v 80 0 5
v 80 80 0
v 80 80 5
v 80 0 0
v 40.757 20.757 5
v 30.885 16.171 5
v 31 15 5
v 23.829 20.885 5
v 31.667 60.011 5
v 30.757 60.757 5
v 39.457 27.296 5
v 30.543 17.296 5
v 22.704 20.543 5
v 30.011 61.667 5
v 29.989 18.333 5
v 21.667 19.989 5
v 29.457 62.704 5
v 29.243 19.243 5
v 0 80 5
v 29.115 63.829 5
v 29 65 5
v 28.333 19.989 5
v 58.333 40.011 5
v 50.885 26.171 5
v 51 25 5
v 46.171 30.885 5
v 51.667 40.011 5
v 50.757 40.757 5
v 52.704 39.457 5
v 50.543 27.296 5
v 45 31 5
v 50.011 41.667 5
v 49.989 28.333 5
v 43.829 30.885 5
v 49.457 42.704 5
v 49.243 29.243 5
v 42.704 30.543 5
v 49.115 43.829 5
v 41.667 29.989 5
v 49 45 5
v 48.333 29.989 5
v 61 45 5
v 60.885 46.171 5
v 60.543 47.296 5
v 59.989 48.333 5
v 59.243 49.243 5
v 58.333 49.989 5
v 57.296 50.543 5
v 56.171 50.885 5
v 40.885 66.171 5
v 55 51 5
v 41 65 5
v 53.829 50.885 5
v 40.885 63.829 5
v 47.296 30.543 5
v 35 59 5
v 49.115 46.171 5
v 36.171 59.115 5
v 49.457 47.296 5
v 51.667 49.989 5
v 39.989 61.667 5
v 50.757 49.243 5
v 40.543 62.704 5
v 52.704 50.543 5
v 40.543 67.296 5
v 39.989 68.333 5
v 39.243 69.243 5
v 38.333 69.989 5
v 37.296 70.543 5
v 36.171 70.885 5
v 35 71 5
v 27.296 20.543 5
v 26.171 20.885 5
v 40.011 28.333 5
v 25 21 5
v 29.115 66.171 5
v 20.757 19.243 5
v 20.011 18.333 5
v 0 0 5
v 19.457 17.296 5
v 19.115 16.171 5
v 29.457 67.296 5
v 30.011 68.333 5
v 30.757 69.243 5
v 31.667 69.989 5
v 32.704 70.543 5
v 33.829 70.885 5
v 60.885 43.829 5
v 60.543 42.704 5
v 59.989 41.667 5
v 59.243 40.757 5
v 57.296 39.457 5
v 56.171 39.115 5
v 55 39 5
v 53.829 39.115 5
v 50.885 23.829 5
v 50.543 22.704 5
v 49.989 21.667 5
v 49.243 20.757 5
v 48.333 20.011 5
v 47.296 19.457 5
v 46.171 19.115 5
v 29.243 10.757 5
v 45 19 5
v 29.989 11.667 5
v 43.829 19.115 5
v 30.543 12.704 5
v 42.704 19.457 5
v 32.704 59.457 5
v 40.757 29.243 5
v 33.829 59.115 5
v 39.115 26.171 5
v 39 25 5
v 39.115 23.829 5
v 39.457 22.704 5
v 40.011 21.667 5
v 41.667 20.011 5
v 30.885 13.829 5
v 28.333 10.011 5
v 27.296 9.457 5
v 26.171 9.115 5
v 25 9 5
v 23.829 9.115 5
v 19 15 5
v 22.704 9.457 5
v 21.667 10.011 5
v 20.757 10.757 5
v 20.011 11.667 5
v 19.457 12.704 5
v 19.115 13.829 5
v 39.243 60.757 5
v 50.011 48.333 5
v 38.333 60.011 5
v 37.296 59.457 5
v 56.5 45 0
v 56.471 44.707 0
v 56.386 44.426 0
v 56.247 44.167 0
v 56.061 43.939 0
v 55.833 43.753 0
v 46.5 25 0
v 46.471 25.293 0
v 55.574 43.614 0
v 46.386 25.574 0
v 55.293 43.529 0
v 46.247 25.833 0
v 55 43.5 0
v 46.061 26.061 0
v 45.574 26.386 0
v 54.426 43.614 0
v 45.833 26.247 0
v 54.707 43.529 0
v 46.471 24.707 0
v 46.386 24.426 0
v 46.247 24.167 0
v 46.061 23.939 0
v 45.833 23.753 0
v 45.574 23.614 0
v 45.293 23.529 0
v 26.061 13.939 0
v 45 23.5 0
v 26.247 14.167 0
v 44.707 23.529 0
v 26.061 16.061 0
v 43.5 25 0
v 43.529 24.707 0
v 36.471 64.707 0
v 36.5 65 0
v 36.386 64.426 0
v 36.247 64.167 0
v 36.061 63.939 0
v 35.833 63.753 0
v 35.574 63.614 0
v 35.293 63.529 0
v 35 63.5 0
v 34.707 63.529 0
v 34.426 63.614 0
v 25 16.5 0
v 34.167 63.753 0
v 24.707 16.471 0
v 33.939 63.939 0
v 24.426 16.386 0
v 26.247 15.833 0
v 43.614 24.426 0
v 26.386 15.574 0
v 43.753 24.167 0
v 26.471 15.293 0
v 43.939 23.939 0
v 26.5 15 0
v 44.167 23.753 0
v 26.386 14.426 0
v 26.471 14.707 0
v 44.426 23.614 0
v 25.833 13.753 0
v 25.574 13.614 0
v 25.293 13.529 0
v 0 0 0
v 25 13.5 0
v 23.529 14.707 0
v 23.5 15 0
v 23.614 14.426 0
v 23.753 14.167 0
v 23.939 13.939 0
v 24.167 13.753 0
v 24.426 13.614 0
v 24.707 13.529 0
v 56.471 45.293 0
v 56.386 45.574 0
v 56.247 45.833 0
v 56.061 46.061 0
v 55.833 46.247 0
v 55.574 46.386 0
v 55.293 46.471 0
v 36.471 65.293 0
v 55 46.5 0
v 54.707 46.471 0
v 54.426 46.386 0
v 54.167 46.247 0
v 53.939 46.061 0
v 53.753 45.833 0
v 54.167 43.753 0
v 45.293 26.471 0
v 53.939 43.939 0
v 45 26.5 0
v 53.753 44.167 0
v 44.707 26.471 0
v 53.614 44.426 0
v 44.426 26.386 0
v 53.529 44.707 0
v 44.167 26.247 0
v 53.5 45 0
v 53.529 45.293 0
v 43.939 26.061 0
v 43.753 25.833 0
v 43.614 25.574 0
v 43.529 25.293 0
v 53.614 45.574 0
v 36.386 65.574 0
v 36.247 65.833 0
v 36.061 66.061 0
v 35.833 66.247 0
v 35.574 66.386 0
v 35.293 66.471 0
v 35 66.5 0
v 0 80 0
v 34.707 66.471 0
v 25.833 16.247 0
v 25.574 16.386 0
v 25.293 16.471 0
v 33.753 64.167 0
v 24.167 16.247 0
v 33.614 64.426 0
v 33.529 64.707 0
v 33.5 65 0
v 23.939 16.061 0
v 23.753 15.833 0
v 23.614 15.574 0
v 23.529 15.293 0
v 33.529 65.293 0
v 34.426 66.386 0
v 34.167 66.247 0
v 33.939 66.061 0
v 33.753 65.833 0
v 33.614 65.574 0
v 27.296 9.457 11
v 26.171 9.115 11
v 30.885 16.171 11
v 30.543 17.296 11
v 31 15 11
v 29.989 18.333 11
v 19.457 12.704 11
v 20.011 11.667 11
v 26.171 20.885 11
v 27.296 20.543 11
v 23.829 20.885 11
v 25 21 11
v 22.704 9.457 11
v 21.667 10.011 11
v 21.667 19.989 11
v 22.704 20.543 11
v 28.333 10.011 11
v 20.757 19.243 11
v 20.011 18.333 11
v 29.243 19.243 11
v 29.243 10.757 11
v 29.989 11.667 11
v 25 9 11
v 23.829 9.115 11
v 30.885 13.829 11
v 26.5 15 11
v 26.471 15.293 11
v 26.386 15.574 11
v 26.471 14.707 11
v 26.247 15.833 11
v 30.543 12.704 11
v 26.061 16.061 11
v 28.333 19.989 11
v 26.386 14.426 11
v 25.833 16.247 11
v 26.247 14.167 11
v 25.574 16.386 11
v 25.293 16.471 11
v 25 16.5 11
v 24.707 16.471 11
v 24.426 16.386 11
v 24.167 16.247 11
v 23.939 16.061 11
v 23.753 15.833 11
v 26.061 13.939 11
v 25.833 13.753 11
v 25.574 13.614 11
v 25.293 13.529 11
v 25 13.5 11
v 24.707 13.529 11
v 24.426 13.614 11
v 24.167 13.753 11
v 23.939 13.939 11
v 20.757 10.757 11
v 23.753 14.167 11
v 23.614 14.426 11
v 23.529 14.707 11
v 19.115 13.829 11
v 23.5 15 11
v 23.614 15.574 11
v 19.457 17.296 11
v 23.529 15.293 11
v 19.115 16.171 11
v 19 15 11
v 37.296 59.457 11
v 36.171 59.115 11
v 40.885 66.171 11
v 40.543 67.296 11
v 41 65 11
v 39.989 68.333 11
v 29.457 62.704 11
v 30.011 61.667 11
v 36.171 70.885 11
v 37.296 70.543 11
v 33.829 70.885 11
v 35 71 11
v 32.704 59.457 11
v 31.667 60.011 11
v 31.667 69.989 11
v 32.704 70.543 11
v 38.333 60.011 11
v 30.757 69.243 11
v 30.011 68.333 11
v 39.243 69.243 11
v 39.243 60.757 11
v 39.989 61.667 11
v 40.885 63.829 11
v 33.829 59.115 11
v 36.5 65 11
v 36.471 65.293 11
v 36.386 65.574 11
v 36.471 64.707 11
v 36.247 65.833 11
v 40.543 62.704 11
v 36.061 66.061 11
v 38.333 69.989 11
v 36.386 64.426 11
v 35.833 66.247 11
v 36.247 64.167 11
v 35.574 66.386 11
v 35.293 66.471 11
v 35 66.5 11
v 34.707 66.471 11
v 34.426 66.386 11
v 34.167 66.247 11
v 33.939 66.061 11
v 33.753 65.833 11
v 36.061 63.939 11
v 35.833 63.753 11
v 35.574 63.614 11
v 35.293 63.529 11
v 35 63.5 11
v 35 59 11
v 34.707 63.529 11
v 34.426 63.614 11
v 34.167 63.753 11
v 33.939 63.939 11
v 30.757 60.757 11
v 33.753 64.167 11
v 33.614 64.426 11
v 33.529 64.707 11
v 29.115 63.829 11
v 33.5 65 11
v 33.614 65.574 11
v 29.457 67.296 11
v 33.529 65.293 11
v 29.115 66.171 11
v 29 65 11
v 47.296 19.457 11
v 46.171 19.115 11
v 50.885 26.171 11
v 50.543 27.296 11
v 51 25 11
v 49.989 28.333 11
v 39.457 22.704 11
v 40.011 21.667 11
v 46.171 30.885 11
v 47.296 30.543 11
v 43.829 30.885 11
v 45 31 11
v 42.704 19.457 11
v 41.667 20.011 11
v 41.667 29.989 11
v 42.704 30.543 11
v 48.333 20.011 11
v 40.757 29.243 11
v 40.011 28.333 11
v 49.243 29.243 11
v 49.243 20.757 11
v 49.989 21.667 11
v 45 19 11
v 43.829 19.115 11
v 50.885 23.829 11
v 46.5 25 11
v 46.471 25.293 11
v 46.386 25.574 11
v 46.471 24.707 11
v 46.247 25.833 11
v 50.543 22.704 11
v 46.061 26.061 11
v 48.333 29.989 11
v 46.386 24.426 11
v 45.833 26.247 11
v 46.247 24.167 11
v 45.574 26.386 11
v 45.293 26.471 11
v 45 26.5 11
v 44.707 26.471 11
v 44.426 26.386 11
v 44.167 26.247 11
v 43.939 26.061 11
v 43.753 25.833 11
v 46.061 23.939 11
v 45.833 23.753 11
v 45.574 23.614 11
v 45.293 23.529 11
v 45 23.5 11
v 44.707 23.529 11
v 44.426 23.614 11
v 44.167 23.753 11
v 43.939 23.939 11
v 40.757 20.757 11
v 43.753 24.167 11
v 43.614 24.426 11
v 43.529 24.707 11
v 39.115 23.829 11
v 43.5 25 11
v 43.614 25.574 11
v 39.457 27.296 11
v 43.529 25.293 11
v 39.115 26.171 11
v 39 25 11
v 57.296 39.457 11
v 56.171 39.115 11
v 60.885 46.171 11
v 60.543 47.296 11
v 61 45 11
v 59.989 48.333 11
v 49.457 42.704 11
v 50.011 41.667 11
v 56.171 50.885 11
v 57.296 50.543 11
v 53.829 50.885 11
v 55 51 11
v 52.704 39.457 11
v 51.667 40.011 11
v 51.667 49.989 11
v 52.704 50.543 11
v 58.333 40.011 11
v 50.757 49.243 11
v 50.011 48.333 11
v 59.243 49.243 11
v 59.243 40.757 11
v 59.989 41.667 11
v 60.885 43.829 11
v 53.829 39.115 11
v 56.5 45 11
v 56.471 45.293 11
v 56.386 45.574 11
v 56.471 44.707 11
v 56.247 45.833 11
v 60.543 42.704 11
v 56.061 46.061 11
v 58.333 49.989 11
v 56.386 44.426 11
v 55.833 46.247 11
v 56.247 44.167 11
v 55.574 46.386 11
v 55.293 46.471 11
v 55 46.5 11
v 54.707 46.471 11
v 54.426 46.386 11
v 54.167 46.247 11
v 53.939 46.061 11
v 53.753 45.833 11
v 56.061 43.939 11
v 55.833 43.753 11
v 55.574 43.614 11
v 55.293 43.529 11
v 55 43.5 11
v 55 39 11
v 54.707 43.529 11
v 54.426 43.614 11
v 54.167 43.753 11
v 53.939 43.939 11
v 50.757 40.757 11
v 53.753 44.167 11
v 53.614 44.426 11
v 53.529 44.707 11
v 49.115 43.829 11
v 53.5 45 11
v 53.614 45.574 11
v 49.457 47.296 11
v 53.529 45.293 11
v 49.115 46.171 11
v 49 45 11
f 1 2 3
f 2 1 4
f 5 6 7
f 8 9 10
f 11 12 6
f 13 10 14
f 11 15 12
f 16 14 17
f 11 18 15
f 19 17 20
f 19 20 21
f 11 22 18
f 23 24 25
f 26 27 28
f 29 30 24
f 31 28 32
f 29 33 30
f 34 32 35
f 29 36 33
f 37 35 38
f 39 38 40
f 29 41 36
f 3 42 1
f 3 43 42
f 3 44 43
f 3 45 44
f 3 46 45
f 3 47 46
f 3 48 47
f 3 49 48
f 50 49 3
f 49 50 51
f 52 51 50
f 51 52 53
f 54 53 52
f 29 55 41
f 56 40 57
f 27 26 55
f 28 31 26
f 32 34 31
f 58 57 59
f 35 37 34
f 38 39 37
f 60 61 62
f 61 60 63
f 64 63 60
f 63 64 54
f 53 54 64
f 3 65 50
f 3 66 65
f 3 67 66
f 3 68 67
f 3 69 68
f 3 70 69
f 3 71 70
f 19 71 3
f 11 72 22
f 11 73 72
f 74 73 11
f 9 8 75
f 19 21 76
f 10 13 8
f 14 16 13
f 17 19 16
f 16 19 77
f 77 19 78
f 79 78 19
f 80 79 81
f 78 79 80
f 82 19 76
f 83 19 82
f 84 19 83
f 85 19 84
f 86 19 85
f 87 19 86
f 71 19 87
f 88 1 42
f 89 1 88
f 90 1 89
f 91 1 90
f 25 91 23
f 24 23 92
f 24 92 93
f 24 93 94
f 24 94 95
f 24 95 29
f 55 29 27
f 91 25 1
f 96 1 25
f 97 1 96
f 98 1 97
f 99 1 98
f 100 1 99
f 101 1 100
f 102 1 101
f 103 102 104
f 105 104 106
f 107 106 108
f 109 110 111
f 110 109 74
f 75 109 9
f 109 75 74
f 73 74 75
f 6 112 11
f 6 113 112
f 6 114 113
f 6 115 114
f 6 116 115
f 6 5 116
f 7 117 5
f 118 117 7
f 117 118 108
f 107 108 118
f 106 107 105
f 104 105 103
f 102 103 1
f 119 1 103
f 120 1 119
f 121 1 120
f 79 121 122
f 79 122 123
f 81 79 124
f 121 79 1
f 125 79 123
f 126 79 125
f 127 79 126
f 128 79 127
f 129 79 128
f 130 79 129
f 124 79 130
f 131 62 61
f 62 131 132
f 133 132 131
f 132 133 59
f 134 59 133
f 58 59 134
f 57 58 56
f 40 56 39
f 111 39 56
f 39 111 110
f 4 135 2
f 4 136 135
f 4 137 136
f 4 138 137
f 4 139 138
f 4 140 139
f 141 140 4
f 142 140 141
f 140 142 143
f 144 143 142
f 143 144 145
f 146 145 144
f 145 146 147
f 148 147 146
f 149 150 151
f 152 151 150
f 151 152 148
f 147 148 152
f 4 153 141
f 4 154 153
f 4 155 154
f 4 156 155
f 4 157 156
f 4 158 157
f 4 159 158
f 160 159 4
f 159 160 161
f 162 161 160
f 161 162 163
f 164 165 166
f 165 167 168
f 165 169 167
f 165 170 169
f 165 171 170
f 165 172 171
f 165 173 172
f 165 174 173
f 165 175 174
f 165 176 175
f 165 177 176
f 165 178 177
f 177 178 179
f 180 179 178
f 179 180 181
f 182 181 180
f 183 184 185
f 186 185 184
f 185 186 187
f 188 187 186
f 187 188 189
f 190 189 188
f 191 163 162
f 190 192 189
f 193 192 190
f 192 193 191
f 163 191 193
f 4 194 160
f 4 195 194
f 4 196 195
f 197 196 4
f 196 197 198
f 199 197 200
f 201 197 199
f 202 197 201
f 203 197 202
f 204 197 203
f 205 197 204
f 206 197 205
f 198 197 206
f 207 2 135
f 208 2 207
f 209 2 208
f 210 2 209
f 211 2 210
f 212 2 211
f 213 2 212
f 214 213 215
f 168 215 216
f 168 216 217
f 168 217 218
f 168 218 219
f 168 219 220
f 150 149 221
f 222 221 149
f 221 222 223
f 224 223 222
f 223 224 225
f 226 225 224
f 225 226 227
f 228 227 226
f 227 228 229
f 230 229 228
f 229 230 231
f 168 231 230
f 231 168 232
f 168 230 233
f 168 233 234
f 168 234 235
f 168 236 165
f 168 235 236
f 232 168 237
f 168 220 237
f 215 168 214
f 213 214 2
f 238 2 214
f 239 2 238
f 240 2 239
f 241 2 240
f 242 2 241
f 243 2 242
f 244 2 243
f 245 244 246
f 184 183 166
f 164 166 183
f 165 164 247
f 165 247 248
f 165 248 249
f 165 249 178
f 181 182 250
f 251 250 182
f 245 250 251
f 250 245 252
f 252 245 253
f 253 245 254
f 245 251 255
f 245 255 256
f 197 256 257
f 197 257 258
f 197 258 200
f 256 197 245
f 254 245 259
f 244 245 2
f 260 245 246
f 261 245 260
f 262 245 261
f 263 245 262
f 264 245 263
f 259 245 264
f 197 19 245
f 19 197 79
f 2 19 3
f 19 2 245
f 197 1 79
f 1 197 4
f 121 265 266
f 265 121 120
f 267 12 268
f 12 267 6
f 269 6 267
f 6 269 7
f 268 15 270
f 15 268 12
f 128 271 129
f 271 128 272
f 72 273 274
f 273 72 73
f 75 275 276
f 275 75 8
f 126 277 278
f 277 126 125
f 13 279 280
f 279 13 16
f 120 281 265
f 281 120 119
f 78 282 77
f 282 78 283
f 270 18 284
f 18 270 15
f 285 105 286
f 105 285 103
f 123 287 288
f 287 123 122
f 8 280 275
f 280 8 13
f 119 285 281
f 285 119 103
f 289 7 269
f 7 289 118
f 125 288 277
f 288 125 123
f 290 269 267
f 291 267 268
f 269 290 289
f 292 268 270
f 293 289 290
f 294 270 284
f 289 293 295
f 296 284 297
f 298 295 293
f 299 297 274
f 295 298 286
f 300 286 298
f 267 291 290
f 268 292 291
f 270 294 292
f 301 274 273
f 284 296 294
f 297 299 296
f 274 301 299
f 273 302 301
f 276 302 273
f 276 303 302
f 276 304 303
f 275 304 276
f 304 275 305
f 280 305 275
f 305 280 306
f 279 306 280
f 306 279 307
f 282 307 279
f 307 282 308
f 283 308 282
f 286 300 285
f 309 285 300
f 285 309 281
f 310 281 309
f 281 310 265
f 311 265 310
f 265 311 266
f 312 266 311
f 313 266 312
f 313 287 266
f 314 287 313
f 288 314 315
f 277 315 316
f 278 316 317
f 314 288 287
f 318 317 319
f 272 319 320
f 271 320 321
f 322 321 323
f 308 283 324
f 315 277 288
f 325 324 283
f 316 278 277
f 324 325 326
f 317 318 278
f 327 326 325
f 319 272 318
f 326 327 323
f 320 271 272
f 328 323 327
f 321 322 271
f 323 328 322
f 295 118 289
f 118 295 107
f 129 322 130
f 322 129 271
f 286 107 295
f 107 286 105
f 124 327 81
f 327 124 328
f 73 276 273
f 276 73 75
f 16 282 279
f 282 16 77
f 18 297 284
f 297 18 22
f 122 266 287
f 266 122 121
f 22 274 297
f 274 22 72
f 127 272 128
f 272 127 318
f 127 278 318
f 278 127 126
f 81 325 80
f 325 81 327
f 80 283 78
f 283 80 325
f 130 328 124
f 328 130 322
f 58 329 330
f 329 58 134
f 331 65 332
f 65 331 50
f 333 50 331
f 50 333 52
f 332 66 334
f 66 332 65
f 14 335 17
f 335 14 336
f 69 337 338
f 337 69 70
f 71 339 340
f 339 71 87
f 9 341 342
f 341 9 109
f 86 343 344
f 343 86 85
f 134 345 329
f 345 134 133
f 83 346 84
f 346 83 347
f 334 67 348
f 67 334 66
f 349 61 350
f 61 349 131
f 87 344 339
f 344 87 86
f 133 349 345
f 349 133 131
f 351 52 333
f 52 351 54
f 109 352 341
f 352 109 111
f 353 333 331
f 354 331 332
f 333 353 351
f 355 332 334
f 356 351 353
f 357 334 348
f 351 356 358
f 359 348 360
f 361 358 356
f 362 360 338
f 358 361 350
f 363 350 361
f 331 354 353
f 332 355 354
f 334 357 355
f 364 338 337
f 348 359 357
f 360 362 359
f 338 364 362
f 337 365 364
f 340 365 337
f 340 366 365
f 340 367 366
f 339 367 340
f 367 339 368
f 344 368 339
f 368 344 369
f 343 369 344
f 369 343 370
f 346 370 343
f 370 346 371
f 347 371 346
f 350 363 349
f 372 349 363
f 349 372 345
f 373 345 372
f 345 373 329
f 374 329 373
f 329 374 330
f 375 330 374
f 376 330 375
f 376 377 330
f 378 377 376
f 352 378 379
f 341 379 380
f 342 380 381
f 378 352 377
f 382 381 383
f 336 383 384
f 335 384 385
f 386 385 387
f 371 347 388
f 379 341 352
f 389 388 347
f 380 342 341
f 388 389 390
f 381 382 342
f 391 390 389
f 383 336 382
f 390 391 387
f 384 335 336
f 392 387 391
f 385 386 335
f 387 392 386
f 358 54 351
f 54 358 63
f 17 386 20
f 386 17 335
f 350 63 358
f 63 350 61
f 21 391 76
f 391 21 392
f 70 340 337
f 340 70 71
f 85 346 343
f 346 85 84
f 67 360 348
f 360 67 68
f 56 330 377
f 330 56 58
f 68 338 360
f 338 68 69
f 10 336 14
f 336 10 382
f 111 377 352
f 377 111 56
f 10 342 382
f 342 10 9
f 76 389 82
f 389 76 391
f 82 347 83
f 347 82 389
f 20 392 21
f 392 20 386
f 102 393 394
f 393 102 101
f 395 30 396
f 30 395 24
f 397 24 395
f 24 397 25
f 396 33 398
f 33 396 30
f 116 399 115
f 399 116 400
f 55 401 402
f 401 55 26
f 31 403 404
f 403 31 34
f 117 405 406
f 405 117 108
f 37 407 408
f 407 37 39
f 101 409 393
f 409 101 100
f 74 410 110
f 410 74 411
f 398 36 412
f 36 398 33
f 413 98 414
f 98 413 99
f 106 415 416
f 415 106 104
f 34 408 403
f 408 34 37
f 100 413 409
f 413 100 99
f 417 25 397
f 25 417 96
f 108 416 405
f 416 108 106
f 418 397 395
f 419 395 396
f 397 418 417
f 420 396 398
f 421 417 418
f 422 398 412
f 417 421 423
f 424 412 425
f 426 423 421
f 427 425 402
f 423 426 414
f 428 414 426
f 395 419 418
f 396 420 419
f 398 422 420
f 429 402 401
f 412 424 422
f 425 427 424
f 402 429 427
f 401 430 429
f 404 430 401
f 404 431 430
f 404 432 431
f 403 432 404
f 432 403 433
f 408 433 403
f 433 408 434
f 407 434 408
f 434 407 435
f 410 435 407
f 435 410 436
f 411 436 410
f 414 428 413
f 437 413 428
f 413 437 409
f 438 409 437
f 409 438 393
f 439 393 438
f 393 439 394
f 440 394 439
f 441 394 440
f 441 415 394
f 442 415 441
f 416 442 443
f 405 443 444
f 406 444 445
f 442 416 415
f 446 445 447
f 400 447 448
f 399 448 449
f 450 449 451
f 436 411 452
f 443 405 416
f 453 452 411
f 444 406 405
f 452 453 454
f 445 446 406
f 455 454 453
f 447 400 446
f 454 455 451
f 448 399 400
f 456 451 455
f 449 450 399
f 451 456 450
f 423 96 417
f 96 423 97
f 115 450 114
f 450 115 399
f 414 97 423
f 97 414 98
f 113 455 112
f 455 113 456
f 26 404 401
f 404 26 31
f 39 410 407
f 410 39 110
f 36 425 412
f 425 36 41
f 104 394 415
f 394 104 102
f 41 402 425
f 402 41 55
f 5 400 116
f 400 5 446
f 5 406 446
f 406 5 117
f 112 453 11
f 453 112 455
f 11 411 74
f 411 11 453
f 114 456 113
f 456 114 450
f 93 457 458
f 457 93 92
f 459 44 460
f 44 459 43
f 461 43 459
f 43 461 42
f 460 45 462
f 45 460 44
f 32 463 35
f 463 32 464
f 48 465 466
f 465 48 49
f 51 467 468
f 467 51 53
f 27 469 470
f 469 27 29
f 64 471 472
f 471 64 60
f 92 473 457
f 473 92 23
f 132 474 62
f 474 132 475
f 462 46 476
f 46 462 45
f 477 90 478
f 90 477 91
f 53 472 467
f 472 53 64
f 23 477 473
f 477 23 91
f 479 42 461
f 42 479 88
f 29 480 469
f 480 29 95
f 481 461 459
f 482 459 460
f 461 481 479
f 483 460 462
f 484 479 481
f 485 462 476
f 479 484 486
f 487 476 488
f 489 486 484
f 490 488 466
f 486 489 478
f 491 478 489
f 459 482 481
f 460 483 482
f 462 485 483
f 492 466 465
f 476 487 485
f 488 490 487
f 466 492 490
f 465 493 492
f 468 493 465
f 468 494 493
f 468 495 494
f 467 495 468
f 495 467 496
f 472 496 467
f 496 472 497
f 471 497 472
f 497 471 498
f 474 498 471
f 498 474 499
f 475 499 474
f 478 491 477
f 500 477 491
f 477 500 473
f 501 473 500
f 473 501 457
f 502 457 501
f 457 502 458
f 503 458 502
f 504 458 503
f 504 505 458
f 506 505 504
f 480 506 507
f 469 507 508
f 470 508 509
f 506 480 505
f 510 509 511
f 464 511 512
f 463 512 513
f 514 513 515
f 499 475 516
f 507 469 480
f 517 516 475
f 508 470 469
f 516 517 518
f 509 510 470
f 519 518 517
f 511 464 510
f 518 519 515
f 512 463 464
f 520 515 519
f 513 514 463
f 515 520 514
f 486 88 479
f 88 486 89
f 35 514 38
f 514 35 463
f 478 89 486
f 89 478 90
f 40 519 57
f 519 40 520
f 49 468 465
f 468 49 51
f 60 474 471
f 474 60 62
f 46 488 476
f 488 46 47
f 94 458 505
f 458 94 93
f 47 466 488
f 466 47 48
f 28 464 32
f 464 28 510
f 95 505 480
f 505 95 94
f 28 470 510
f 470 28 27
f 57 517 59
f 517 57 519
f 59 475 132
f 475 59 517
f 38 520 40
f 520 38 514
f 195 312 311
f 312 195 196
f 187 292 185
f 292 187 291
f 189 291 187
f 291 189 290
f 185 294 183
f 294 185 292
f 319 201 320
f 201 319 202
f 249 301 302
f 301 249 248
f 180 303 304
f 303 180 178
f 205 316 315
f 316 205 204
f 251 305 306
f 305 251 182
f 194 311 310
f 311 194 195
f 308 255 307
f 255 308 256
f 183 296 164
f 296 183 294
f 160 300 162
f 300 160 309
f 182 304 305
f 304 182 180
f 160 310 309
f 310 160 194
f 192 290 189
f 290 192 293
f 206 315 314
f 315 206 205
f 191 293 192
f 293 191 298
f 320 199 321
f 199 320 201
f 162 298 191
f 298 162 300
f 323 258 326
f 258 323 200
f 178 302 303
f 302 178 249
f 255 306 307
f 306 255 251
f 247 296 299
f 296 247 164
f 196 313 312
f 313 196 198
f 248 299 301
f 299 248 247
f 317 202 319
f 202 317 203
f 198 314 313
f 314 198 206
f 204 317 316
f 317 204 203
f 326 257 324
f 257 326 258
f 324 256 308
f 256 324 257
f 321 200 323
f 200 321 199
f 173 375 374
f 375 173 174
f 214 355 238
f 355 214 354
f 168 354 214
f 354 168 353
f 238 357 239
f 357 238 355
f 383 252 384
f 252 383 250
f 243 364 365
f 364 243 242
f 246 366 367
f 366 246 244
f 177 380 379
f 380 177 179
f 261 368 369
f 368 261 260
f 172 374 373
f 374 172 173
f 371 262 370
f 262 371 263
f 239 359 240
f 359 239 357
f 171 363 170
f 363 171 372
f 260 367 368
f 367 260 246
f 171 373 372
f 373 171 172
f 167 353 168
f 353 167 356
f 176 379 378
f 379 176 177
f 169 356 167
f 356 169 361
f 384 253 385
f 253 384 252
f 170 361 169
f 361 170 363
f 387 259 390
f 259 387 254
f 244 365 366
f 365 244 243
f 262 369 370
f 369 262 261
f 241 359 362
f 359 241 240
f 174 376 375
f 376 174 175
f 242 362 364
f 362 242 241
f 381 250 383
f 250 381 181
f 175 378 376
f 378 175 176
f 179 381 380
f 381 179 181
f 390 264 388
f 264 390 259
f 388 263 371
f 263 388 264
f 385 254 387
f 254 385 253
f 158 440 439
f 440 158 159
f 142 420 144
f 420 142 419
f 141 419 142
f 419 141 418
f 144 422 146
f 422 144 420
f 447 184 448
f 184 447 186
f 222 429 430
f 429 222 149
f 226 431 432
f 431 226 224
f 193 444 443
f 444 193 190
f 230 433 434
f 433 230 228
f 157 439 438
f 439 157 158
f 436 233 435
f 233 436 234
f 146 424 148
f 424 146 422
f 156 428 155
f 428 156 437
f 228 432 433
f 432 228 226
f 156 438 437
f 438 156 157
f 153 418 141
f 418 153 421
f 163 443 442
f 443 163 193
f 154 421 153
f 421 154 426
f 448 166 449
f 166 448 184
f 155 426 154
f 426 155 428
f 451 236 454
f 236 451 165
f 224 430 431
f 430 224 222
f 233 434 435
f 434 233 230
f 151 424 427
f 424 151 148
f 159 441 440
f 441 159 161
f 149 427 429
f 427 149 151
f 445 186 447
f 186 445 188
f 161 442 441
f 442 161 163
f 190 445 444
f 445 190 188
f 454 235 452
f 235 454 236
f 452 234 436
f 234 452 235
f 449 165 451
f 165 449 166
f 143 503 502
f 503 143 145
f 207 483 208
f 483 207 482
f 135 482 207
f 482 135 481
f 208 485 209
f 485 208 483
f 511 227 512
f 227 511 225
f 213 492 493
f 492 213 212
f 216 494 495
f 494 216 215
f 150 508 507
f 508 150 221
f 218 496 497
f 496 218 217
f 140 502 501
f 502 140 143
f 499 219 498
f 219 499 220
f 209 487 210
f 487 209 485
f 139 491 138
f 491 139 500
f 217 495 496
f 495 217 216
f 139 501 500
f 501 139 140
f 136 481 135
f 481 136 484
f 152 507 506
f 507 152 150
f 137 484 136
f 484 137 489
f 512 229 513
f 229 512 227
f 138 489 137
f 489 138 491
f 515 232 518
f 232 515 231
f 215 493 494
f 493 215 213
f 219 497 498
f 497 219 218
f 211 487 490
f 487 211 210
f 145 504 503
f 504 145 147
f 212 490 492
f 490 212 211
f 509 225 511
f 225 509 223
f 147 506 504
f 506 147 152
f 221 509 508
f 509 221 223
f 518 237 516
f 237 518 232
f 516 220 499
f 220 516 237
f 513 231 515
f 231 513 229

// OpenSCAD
$fn = 32;

// ----------------------------------------------------------------------
// Boss field: plate with bosses at given coordinates
// ----------------------------------------------------------------------

// --- parameters (mm) ---
plate_l = 80;             // plate length, X
plate_w = 80;             // plate width, Y
plate_t = 5;              // plate thickness, Z
boss_d = 12;              // boss diameter
boss_h = 6;               // boss height above the plate
bore_d = 3;               // boss bore

total_h = plate_t + boss_h;  // overall height

difference() {
  union() {
    cube([plate_l, plate_w, plate_t]);
    translate([25, 15, plate_t]) cylinder(h = boss_h, d = boss_d);
    translate([35, 65, plate_t]) cylinder(h = boss_h, d = boss_d);
    translate([45, 25, plate_t]) cylinder(h = boss_h, d = boss_d);
    translate([55, 45, plate_t]) cylinder(h = boss_h, d = boss_d);
  }
  translate([25, 15, -1]) cylinder(h = total_h + 2, d = bore_d);
  translate([35, 65, -1]) cylinder(h = total_h + 2, d = bore_d);
  translate([45, 25, -1]) cylinder(h = total_h + 2, d = bore_d);
  translate([55, 45, -1]) cylinder(h = total_h + 2, d = bore_d);
}
